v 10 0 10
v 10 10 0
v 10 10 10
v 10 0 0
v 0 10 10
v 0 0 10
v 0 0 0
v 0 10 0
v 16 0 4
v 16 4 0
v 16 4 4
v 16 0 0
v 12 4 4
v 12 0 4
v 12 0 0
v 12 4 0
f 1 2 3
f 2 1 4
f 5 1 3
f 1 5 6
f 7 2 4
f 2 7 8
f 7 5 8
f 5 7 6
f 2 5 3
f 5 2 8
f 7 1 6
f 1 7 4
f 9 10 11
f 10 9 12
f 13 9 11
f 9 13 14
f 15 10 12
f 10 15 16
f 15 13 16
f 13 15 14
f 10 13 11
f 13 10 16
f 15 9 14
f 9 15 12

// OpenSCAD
// The four modifier characters, which are geometry-visible in an export:
//   *  disables the subtree entirely
//   !  makes that subtree the whole model, discarding everything else
//   #  highlights but keeps the geometry
//   %  is background and is *excluded* from the rendered result
// Without `!` here the result would be the union of the cube and the sphere;
// the disabled and background parts must not appear either way.
cube(10);
*cube(100);              // disabled
#translate([12,0,0]) cube(4);   // highlighted, still exported
%translate([0,12,0]) cube(9);   // background, not exported
